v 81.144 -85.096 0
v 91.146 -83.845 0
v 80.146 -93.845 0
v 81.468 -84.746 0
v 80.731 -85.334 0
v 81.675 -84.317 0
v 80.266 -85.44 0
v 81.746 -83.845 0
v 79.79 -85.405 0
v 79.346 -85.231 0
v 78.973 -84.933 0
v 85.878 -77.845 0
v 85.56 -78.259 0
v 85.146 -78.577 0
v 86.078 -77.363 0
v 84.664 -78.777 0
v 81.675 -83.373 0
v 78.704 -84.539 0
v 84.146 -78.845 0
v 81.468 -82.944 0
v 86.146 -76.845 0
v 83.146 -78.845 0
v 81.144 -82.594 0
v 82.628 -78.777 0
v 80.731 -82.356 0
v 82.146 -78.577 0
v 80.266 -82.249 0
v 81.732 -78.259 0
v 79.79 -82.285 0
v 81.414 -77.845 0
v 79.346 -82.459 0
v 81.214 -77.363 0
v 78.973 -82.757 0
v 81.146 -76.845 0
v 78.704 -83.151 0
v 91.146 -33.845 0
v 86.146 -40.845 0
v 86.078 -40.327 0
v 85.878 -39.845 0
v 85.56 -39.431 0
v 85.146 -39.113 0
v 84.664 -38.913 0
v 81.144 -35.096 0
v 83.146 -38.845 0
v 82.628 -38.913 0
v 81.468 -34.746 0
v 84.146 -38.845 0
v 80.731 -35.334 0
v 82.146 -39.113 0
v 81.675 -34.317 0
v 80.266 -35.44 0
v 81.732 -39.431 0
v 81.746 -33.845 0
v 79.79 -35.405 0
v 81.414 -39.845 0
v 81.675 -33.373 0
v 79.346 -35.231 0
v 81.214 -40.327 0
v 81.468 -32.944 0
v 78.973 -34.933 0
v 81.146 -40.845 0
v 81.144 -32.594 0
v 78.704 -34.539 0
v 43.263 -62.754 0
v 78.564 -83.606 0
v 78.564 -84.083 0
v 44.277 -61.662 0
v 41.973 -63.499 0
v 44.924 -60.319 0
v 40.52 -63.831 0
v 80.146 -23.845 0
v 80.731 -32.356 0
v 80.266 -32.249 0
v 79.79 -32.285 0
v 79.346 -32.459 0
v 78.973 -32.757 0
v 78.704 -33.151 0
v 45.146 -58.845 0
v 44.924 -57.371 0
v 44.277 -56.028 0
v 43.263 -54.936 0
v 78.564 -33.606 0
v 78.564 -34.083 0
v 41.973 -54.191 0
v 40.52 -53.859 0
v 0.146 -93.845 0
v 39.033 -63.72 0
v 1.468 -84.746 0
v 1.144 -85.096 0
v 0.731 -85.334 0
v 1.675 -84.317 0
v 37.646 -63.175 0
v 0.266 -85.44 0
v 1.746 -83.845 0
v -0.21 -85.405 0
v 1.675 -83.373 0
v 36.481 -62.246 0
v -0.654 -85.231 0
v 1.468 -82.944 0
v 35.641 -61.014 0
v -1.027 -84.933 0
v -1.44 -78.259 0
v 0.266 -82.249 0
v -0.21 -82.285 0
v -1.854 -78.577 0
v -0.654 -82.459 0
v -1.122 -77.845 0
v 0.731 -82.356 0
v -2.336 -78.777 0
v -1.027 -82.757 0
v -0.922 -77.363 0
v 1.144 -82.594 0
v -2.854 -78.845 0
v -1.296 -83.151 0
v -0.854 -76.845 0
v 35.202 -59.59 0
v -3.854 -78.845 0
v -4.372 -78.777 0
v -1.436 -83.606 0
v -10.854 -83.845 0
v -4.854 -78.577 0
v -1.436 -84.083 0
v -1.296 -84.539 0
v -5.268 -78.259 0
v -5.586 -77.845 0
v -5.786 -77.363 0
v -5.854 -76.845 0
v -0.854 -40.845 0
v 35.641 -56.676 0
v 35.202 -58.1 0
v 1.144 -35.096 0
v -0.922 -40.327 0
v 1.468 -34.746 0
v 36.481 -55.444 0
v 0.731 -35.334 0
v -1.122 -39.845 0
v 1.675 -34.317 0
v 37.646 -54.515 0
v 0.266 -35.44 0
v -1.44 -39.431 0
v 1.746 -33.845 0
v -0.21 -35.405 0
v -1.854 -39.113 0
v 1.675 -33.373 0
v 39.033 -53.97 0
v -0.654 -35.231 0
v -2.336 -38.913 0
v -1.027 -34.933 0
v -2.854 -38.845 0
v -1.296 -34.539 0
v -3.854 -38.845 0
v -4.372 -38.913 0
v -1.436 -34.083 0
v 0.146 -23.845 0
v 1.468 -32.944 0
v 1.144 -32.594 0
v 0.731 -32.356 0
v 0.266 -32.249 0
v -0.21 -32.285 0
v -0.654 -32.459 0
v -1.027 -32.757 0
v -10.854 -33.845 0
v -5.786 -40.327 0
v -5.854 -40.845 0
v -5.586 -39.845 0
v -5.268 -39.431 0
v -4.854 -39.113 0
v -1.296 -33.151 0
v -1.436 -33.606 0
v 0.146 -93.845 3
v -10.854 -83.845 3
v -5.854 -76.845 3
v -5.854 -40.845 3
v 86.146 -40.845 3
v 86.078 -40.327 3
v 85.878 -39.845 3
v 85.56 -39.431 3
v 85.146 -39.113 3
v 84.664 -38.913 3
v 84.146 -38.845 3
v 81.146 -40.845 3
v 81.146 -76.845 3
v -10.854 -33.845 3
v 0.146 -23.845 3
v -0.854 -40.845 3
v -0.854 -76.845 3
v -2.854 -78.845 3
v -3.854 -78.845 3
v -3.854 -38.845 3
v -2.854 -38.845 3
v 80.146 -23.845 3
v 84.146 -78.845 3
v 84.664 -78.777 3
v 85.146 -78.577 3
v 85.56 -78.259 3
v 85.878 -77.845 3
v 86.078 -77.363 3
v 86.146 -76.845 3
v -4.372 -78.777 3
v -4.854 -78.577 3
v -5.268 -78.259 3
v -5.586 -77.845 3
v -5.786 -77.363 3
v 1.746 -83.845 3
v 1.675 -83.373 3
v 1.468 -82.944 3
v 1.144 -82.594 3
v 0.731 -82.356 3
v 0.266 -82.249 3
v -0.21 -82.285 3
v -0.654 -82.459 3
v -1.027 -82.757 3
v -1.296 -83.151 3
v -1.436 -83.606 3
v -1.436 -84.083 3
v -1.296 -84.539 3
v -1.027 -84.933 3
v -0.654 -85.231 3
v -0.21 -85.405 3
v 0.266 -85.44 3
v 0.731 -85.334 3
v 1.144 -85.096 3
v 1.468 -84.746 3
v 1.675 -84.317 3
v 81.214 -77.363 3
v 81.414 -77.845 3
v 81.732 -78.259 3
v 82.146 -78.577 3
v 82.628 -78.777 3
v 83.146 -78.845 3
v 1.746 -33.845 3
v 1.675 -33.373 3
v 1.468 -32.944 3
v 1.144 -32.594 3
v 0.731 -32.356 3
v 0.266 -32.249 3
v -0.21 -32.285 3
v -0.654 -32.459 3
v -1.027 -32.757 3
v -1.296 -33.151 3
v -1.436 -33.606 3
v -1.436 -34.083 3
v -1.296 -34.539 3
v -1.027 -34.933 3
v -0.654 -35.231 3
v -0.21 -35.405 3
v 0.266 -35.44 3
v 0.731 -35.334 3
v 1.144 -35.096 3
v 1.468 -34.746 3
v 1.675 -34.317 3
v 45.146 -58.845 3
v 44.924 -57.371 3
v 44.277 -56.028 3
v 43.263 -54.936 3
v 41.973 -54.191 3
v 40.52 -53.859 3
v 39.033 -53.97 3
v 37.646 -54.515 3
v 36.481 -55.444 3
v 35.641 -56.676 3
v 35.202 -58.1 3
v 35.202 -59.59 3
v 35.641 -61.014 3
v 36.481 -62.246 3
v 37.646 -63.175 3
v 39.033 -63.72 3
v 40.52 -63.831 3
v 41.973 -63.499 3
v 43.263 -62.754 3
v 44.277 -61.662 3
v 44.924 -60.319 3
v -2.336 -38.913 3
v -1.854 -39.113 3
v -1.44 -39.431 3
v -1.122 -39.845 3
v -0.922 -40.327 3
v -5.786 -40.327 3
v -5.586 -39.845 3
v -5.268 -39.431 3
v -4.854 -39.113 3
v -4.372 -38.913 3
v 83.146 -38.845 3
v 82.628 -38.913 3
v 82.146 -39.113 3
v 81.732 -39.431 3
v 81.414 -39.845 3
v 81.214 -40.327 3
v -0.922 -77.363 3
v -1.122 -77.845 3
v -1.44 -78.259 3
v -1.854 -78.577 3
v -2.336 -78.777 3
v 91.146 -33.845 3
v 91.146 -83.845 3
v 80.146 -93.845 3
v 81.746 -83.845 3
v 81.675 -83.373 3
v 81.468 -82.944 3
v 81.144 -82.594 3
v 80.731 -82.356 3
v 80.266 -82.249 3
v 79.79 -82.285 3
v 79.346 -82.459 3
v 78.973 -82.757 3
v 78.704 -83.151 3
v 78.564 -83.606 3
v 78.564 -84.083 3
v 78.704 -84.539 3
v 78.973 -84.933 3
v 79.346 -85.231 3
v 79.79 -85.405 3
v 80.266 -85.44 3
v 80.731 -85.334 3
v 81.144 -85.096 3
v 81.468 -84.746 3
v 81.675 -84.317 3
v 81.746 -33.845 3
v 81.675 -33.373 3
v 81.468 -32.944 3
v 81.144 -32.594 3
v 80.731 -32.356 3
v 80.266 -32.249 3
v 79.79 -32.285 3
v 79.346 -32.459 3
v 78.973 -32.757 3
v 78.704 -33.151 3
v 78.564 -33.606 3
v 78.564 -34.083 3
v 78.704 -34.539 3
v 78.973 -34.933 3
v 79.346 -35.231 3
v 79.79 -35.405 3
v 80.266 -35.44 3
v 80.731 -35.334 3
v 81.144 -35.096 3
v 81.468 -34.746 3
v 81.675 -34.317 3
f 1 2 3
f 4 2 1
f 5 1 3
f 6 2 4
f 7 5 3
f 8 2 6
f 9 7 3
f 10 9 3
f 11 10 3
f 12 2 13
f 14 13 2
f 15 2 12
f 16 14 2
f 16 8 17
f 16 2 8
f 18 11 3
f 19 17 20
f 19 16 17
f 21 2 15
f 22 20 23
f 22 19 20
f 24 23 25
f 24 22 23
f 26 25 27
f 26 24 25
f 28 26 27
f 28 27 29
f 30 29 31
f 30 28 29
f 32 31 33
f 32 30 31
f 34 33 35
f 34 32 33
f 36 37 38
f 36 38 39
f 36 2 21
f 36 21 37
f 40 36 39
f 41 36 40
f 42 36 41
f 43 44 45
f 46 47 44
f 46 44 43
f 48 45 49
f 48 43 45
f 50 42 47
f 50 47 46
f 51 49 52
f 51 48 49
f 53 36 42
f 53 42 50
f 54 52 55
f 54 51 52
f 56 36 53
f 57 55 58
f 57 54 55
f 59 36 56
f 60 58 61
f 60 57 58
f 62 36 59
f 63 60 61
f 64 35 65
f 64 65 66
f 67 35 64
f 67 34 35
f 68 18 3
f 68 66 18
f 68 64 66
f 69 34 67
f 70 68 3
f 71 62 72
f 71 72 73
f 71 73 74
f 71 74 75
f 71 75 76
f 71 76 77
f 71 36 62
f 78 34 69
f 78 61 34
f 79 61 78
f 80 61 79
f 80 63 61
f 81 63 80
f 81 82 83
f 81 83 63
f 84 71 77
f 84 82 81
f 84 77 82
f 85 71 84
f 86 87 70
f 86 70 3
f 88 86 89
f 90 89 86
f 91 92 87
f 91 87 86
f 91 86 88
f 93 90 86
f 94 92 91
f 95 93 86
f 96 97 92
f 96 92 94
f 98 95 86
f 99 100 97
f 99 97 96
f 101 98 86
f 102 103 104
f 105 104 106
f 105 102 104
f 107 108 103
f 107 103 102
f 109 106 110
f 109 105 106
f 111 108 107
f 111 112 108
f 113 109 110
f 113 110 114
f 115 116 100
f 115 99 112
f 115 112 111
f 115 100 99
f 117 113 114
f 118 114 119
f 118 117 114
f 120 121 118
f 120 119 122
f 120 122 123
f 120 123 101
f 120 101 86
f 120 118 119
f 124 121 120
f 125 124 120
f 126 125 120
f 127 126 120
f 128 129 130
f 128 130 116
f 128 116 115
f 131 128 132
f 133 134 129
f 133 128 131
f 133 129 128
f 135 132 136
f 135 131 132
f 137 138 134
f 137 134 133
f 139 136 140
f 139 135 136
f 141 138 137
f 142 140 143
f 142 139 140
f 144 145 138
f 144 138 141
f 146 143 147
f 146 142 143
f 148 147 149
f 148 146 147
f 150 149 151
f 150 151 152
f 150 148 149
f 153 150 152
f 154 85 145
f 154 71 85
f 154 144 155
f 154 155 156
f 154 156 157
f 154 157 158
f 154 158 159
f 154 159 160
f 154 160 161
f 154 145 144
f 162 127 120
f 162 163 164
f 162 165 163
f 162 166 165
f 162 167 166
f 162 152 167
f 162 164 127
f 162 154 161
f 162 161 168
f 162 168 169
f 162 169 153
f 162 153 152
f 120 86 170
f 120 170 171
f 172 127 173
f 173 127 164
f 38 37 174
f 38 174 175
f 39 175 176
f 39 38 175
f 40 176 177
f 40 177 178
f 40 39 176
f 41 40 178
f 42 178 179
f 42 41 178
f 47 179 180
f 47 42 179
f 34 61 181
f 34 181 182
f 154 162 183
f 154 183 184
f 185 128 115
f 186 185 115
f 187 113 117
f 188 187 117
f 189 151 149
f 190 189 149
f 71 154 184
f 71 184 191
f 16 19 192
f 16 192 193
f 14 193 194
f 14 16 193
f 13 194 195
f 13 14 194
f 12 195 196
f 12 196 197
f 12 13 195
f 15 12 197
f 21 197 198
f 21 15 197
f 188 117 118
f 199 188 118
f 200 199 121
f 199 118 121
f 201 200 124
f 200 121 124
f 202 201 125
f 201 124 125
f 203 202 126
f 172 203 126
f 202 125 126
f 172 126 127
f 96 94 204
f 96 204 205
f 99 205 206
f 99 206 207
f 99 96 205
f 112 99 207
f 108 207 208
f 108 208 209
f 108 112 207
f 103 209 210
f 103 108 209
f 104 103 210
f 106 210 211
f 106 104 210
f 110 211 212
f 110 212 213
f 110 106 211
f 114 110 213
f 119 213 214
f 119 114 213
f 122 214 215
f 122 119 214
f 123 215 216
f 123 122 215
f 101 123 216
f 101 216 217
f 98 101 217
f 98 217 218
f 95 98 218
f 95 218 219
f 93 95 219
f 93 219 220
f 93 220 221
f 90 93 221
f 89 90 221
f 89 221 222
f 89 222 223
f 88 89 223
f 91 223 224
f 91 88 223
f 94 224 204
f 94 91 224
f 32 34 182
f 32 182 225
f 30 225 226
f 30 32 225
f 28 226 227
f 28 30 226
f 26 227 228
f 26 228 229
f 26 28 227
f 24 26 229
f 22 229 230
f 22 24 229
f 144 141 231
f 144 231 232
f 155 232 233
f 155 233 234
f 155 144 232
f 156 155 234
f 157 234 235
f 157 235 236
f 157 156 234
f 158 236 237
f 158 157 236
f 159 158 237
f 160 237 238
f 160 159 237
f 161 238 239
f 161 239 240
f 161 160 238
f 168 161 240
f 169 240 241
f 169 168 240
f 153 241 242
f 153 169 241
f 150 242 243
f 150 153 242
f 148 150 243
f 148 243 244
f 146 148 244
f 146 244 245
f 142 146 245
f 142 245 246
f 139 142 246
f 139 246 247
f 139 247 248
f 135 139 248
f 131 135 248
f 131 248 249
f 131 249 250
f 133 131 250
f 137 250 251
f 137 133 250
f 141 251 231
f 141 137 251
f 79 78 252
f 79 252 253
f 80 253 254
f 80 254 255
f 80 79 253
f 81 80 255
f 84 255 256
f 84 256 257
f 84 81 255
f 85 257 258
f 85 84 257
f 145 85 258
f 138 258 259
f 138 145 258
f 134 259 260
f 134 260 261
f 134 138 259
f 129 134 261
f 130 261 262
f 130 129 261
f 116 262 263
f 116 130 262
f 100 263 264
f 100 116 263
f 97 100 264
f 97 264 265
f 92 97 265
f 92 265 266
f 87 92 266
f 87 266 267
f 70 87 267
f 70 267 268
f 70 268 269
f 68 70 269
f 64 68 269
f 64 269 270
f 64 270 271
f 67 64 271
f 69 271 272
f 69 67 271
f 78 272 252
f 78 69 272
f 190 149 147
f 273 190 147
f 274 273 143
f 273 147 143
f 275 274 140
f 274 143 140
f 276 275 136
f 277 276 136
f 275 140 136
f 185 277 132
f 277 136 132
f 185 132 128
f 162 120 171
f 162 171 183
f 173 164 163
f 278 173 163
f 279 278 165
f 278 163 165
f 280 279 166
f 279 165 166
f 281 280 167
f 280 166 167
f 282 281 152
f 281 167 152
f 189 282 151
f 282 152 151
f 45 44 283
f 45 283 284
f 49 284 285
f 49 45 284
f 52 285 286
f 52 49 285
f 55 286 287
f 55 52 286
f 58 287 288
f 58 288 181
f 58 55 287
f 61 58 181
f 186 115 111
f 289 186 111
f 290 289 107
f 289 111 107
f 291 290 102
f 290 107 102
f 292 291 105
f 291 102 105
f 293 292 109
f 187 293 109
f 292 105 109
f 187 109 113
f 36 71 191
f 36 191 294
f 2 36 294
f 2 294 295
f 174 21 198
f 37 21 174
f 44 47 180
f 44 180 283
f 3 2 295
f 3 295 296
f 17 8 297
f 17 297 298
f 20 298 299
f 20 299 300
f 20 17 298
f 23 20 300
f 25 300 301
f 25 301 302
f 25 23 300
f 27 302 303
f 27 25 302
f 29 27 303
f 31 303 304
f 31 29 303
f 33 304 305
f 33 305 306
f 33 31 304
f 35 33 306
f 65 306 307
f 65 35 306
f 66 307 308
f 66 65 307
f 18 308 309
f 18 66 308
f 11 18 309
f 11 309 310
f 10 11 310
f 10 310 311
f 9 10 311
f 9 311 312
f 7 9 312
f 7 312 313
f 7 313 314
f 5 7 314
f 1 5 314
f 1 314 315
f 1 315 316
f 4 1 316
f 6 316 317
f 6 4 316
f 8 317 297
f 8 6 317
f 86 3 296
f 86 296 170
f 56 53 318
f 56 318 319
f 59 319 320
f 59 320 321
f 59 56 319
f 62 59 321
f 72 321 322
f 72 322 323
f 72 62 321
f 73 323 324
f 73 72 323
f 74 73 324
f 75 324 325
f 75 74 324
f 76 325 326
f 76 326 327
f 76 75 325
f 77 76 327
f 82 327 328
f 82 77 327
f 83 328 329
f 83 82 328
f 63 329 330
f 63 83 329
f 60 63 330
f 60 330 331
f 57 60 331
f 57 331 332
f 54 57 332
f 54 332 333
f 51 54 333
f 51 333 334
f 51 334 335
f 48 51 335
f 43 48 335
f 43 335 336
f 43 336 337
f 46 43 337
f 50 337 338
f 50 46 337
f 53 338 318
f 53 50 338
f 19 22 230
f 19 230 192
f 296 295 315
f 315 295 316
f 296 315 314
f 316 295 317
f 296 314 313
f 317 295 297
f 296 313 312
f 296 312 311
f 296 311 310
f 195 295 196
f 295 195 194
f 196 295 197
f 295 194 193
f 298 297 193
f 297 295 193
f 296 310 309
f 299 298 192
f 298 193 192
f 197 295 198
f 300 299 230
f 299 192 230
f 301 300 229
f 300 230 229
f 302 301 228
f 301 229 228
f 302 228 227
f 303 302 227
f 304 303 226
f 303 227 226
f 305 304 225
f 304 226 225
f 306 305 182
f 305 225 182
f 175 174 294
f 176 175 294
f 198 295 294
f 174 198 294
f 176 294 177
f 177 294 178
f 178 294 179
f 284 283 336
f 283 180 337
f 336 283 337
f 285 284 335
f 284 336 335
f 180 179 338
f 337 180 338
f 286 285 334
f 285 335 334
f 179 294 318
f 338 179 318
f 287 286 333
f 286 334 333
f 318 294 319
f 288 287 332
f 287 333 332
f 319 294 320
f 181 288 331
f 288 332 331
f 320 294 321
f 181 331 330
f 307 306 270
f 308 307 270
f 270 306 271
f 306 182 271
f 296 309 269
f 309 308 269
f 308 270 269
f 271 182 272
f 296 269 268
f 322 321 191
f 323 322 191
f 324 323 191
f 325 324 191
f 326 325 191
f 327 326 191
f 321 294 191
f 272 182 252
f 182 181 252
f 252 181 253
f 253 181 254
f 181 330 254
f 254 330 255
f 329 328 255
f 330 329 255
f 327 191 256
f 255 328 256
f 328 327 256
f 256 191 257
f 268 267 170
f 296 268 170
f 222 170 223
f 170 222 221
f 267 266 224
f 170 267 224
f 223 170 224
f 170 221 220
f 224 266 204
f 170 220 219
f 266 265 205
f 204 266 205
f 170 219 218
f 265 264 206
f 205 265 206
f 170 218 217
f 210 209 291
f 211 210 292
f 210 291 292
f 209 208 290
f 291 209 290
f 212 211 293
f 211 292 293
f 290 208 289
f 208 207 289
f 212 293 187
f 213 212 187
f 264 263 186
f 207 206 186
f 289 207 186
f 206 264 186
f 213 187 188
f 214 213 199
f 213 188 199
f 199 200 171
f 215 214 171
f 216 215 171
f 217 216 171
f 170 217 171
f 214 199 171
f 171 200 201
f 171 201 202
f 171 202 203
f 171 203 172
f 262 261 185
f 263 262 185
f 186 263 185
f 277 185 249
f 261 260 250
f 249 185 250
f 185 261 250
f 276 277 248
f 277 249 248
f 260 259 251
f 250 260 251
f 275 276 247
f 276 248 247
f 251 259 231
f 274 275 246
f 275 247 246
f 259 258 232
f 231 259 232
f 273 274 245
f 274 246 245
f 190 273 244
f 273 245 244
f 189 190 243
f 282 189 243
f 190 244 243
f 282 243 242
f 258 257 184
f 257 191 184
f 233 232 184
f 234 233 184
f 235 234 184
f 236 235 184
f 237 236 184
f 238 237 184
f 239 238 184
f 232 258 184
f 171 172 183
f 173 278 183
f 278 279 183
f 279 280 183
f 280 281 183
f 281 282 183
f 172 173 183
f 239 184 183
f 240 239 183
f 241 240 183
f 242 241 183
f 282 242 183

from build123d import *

# Parameters (mm, degrees)
SKETCH1_R           = 1.6
SKETCH1_R_2         = 5
BOSS_EXTRUDE1_DEPTH = 3


with BuildPart() as part:
    # Sketch1 → Boss-Extrude1 (new body)
    with BuildSketch(Plane.XY):
        Polygon((-10.853989547, -33.844947192), (0.146010453, -23.844947192), (80.146010453, -23.844947192), (91.146010453, -33.844947192), (91.146010453, -83.844947192), (80.146010453, -93.844947192), (0.146010453, -93.844947192), (-10.853989547, -83.844947192), align=None)
        with Locations((0.146010453, -33.844947192)):
            Circle(SKETCH1_R, mode=Mode.SUBTRACT)
        with Locations((80.146010453, -33.844947192)):
            Circle(SKETCH1_R, mode=Mode.SUBTRACT)
        with Locations((80.146010453, -83.844947192)):
            Circle(SKETCH1_R, mode=Mode.SUBTRACT)
        with Locations((0.146010453, -83.844947192)):
            Circle(SKETCH1_R, mode=Mode.SUBTRACT)
        with Locations((40.146010453, -58.844947192)):
            Circle(SKETCH1_R_2, mode=Mode.SUBTRACT)
        with BuildLine():
            Line((-3.853989547, -38.844947192), (-2.853989547, -38.844947192))
            ThreePointArc((-2.853989547, -38.844947192), (-1.439775984, -39.430733629), (-0.853989547, -40.844947192))
            Line((-0.853989547, -40.844947192), (-0.853989547, -76.844947192))
            ThreePointArc((-0.853989547, -76.844947192), (-1.439775984, -78.259160754), (-2.853989547, -78.844947192))
            Line((-2.853989547, -78.844947192), (-3.853989547, -78.844947192))
            ThreePointArc((-3.853989547, -78.844947192), (-5.268203109, -78.259160754), (-5.853989547, -76.844947192))
            Line((-5.853989547, -76.844947192), (-5.853989547, -40.844947192))
            ThreePointArc((-5.853989547, -40.844947192), (-5.268203109, -39.430733629), (-3.853989547, -38.844947192))
        make_face(mode=Mode.SUBTRACT)
        with BuildLine():
            Line((84.146010453, -38.844947192), (83.146010453, -38.844947192))
            ThreePointArc((83.146010453, -38.844947192), (81.731796891, -39.430733629), (81.146010453, -40.844947192))
            Line((81.146010453, -40.844947192), (81.146010453, -76.844947192))
            ThreePointArc((81.146010453, -76.844947192), (81.731796891, -78.259160754), (83.146010453, -78.844947192))
            Line((83.146010453, -78.844947192), (84.146010453, -78.844947192))
            ThreePointArc((84.146010453, -78.844947192), (85.560224016, -78.259160754), (86.146010453, -76.844947192))
            Line((86.146010453, -76.844947192), (86.146010453, -40.844947192))
            ThreePointArc((86.146010453, -40.844947192), (85.560224016, -39.430733629), (84.146010453, -38.844947192))
        make_face(mode=Mode.SUBTRACT)
    extrude(amount=BOSS_EXTRUDE1_DEPTH)


solid = part.part
